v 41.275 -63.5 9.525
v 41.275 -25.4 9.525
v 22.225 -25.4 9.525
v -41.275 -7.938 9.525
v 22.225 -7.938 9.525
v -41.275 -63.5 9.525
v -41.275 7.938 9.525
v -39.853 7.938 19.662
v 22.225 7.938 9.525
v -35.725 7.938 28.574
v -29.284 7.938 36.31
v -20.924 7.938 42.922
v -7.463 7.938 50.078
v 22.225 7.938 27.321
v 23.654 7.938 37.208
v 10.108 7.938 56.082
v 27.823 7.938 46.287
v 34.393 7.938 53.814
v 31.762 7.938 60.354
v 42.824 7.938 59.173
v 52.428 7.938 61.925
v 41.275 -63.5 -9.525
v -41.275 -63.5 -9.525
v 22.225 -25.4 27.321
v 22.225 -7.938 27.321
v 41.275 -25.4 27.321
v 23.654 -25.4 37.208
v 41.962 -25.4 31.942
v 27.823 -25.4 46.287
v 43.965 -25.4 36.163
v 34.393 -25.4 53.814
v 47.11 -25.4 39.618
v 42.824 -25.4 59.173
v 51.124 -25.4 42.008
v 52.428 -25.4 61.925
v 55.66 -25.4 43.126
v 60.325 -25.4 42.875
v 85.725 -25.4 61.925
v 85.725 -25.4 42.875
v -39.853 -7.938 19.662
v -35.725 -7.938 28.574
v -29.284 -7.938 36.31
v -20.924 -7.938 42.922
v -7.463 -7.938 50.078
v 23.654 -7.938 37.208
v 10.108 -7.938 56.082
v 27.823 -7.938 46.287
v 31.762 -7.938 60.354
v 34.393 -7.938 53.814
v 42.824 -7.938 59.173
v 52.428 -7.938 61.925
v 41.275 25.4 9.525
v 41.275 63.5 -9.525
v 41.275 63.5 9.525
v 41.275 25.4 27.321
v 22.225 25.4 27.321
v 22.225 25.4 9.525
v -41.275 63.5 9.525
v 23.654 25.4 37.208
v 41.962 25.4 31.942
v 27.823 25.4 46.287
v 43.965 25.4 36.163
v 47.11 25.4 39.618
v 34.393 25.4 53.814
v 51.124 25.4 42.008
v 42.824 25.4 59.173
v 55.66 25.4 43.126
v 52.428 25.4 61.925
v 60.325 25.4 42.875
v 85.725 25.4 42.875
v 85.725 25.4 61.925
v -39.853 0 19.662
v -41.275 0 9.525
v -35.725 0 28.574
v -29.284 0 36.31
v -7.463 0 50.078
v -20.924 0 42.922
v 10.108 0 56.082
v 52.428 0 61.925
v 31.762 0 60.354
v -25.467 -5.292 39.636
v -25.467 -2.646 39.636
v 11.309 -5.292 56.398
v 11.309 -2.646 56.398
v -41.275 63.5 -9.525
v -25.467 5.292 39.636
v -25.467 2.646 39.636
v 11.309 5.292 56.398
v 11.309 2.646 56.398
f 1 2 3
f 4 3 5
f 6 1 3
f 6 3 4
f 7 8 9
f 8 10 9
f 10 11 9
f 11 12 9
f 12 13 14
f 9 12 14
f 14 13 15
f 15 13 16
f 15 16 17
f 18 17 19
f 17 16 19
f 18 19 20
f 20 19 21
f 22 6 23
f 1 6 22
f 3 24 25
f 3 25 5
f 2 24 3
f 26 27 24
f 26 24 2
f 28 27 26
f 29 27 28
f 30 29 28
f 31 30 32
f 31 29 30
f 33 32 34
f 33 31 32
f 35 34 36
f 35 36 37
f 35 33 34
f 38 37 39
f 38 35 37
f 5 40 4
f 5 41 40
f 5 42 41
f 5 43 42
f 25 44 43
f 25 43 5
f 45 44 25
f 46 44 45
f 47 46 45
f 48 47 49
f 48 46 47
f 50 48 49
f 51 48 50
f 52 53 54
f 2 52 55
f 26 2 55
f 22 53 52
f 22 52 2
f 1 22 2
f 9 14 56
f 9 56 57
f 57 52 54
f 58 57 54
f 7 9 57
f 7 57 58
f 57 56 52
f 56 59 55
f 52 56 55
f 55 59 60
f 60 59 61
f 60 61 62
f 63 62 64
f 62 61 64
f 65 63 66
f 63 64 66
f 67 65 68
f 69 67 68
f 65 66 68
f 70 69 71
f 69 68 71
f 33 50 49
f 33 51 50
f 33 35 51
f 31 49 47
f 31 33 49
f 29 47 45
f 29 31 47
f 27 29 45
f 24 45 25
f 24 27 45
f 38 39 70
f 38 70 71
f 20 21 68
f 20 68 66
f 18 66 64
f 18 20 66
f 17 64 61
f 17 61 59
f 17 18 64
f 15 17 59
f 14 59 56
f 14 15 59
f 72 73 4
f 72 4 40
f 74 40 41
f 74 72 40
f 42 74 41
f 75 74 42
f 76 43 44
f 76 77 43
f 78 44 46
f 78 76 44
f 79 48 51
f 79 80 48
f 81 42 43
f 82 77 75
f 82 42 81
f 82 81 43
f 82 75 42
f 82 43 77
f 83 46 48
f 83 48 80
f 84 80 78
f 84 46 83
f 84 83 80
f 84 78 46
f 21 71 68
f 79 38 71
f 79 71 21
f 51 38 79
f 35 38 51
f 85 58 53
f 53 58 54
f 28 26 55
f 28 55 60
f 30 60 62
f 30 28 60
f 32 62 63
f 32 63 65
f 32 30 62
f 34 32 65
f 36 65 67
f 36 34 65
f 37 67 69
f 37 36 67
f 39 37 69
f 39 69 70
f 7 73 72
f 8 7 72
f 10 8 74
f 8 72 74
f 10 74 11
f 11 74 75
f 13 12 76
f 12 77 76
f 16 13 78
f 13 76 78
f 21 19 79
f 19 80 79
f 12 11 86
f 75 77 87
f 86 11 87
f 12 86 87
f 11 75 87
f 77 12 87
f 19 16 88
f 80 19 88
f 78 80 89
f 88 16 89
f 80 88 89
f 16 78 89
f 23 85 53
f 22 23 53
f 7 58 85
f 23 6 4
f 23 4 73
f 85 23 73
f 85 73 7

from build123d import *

# Parameters (mm, degrees)
F1_DEPTH = 63.5
F0_W     = 25.4
F0_H     = 19.05
F2_DEPTH = 25.4
F3_DEPTH = 7.9375


with BuildPart() as f1:
    # F0 (on Front) → F1 (new body, symmetric)
    with BuildSketch(Plane.XZ):
        Polygon((41.275, -9.525), (41.275, 9.525), (22.225, 9.525), (-41.275, 9.525), (-41.275, -9.525), align=None)
    extrude(amount=F1_DEPTH, both=True)

    # F0 (on Front) → F2 (join, symmetric)
    with BuildSketch(Plane.XZ):
        with BuildLine():
            Line((22.225, 9.525), (41.275, 9.525))
            Line((41.275, 9.525), (41.275, 27.32094))
            ThreePointArc((41.275, 27.32094), (47.109768, 39.617662), (60.325, 42.8752))
            Line((60.325, 42.8752), (60.325, 61.9252))
            Line((60.325, 61.9252), (52.427625, 61.9252))
            ThreePointArc((52.427625, 61.9252), (30.837602, 50.286422), (22.225, 27.32094))
            Line((22.225, 27.32094), (22.225, 9.525))
        make_face()
        with Locations((73.025, 52.4002)):
            Rectangle(F0_W, F0_H)
    extrude(amount=F2_DEPTH, both=True)

    # F0 (on Front) → F3 (join, symmetric)
    with BuildSketch(Plane.XZ):
        with BuildLine():
            Line((-41.275, 9.525), (22.225, 9.525))
            Line((22.225, 9.525), (22.225, 27.32094))
            ThreePointArc((22.225, 27.32094), (30.837602, 50.286422), (52.427625, 61.9252))
            add(Edge.make_bspline(
                [(-41.275, 9.525), (-41.49317, 47.016986), (14.679759, 61.308946), (52.427625, 61.9252)],
                knots=[0, 0, 0, 0, 107.359037, 107.359037, 107.359037, 107.359037], degree=3))
        make_face()
    extrude(amount=F3_DEPTH, both=True)


solid = f1.part
